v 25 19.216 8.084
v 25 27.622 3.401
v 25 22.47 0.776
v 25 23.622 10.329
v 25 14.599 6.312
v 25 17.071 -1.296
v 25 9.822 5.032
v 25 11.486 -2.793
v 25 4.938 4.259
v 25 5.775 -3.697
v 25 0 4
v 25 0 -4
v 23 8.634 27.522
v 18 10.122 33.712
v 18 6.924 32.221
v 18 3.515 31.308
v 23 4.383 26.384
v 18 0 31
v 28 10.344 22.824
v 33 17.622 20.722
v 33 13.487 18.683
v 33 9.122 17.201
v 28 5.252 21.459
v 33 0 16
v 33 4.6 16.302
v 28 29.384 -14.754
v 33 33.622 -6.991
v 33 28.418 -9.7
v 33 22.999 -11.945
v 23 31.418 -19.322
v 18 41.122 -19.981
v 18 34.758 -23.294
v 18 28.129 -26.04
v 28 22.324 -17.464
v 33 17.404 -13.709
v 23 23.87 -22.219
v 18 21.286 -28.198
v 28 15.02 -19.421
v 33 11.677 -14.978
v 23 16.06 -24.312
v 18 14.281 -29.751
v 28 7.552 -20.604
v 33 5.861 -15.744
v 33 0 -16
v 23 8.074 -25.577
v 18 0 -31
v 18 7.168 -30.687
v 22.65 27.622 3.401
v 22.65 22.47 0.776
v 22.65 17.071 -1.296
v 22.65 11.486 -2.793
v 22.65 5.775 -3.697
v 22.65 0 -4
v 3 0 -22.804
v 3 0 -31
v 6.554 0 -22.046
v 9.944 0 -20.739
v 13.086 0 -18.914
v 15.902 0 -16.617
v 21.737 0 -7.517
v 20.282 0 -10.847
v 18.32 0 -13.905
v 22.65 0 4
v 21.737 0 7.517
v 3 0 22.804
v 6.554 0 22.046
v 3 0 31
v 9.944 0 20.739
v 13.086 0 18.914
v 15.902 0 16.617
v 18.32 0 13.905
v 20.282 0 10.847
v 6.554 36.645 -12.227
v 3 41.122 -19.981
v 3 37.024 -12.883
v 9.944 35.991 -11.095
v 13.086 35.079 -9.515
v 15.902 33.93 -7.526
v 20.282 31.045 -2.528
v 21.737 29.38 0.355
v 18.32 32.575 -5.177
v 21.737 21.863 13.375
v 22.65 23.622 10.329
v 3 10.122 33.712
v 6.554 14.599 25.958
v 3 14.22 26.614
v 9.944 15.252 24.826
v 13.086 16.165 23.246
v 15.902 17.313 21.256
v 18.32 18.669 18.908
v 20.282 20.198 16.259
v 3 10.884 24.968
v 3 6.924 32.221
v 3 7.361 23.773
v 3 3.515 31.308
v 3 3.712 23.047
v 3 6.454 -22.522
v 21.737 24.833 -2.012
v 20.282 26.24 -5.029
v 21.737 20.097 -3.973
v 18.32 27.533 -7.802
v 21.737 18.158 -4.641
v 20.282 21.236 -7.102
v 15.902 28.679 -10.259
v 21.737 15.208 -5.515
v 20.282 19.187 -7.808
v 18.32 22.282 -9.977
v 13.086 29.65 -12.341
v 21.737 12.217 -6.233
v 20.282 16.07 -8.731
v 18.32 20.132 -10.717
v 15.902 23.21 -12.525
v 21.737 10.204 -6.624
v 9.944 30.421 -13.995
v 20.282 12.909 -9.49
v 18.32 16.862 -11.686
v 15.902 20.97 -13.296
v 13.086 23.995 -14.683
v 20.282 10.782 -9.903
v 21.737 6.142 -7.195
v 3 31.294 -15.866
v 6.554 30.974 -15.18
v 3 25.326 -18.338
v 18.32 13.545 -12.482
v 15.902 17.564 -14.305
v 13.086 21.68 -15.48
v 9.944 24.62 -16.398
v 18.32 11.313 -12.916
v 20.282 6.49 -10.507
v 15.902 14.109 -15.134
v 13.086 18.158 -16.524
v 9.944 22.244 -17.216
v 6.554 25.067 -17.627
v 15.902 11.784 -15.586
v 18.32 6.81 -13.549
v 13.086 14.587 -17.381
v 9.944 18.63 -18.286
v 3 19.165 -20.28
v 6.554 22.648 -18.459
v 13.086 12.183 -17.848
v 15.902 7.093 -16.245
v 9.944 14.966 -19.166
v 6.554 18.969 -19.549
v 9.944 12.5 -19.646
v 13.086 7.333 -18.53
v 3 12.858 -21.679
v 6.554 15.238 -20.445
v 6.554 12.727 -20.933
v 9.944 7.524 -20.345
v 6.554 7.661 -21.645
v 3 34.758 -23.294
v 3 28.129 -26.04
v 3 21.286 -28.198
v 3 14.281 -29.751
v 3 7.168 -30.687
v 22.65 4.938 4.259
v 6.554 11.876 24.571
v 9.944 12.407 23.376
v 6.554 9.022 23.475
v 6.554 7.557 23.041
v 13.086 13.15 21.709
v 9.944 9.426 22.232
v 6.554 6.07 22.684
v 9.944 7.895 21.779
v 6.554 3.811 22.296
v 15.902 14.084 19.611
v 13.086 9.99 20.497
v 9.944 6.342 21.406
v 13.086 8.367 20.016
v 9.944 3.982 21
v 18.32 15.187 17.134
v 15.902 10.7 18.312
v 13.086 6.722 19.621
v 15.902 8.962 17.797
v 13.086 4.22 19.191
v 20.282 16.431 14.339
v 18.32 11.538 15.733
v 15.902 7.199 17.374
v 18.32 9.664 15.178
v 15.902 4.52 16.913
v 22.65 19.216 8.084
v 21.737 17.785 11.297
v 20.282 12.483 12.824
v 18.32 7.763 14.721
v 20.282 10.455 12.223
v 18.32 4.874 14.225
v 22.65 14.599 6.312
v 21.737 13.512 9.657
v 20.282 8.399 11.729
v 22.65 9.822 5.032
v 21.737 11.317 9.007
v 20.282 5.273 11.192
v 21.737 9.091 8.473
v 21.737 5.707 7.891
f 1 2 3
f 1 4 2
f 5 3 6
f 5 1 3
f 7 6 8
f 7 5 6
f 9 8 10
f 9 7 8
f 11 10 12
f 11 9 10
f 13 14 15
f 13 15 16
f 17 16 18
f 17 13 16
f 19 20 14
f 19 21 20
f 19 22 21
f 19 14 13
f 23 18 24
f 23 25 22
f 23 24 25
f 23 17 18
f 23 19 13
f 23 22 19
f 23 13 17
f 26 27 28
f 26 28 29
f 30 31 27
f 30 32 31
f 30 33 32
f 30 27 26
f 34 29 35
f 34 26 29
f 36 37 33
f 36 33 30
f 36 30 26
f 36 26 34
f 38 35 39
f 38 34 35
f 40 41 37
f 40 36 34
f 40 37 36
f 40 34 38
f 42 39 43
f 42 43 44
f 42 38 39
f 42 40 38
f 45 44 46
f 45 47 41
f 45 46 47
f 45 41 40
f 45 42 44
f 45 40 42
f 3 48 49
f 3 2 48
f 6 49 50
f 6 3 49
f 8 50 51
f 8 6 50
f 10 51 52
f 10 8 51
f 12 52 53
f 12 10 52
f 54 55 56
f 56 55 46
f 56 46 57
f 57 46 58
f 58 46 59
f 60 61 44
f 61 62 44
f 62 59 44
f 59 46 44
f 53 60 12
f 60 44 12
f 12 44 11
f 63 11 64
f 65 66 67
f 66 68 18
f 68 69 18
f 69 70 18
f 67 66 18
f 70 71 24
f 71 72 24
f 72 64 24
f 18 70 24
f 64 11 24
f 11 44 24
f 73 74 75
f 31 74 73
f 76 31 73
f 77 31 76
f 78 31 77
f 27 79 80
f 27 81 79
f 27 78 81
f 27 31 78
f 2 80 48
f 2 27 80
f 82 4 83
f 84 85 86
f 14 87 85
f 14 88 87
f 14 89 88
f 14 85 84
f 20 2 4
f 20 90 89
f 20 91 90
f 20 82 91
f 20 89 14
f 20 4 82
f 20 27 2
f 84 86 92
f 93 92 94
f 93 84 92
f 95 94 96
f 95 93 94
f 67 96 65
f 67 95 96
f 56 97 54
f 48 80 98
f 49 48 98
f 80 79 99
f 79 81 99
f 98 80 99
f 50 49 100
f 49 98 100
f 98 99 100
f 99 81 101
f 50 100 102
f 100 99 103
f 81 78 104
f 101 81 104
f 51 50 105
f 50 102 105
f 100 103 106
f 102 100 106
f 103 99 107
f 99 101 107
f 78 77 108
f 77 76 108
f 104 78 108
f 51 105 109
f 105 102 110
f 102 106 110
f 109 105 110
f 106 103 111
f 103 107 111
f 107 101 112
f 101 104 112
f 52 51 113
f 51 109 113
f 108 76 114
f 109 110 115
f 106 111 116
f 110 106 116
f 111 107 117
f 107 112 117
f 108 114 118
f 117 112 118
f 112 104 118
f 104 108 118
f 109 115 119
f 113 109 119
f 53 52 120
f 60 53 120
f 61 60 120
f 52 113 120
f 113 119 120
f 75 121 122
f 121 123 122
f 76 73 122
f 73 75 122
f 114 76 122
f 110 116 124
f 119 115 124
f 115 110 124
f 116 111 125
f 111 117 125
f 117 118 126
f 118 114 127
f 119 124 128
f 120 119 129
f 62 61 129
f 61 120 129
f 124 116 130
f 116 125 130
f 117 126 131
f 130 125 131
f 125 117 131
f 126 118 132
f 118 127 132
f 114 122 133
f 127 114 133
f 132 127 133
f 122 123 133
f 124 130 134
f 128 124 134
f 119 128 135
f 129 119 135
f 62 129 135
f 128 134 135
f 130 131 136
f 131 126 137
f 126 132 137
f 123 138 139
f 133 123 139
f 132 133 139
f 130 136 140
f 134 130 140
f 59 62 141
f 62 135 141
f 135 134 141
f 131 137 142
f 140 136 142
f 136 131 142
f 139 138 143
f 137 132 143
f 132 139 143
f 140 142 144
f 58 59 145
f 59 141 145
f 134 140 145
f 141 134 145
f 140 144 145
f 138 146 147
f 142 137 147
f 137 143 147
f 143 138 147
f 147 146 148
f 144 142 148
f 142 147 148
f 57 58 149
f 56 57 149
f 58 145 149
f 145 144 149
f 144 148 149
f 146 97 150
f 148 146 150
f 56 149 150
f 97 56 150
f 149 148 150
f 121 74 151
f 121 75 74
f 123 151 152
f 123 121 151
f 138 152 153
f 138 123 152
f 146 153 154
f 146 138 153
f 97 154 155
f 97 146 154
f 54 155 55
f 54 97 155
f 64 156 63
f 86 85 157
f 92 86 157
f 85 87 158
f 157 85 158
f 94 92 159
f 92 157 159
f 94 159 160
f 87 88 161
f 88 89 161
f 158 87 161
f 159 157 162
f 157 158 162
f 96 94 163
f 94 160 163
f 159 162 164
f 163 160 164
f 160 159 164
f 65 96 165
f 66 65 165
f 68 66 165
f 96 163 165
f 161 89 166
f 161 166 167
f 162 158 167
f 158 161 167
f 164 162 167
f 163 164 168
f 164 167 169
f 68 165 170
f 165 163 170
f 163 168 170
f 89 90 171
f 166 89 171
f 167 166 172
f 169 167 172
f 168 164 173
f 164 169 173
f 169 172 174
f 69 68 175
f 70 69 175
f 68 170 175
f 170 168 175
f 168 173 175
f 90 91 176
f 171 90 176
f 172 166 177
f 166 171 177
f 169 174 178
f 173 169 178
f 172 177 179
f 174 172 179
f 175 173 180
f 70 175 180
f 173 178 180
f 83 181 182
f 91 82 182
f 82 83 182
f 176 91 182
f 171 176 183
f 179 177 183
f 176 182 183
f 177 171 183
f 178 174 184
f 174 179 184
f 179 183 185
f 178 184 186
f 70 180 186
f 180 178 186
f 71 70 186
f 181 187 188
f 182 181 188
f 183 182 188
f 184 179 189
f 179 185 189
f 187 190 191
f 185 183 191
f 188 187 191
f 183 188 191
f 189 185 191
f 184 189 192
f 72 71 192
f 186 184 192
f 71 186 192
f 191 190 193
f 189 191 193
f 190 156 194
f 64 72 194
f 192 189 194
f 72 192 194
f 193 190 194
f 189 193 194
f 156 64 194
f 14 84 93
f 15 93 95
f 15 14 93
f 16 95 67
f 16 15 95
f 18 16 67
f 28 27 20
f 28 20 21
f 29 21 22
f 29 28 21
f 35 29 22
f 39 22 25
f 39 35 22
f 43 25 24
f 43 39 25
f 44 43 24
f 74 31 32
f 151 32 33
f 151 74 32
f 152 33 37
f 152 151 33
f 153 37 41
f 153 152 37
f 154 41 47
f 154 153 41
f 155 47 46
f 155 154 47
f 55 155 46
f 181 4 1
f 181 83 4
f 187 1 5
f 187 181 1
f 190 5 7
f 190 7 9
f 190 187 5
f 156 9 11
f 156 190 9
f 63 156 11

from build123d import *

# Parameters (mm, degrees)
CHAMFER1_SIZE = 15


with BuildPart() as part:
    # Sweep3: sweep along a path in Sketch1
    with BuildLine(Plane(origin=(0, 0, 0), x_dir=(0, 0, -1), z_dir=(1, 0, 0))) as sweep3_path:
        ThreePointArc((-6.865334795, 25.621778265), (-1.746081847, 13.262808369), (0, 0))
    # Sketch2 → Sweep3 (sweep)
    with BuildSketch(Plane(origin=(0, 0, 0), x_dir=(1, 0, 0), z_dir=(0, 1, 0))):
        with BuildLine():
            Line((3, 22.803508502), (3, 31))
            Line((3, 31), (33, 31))
            Line((33, 31), (33, -31))
            Line((33, -31), (3, -31))
            Line((3, -31), (3, -22.803508502))
            ThreePointArc((3, -22.803508502), (15.901799834, -16.617242913), (22.649503306, -4))
            Line((22.649503306, -4), (25, -4))
            Line((25, -4), (25, 4))
            Line((25, 4), (22.649503306, 4))
            ThreePointArc((22.649503306, 4), (15.901799834, 16.617242913), (3, 22.803508502))
        make_face()
    sweep(path=sweep3_path.line)

    # Chamfer1
    chamfer1_edges = [part.edges().sort_by_distance(p)[0] for p in [
        (33, 5.239417971, 31.689782462),
        (33, 21.286198767, -28.197618768),
    ]]
    chamfer(chamfer1_edges, length=CHAMFER1_SIZE)


solid = part.part
